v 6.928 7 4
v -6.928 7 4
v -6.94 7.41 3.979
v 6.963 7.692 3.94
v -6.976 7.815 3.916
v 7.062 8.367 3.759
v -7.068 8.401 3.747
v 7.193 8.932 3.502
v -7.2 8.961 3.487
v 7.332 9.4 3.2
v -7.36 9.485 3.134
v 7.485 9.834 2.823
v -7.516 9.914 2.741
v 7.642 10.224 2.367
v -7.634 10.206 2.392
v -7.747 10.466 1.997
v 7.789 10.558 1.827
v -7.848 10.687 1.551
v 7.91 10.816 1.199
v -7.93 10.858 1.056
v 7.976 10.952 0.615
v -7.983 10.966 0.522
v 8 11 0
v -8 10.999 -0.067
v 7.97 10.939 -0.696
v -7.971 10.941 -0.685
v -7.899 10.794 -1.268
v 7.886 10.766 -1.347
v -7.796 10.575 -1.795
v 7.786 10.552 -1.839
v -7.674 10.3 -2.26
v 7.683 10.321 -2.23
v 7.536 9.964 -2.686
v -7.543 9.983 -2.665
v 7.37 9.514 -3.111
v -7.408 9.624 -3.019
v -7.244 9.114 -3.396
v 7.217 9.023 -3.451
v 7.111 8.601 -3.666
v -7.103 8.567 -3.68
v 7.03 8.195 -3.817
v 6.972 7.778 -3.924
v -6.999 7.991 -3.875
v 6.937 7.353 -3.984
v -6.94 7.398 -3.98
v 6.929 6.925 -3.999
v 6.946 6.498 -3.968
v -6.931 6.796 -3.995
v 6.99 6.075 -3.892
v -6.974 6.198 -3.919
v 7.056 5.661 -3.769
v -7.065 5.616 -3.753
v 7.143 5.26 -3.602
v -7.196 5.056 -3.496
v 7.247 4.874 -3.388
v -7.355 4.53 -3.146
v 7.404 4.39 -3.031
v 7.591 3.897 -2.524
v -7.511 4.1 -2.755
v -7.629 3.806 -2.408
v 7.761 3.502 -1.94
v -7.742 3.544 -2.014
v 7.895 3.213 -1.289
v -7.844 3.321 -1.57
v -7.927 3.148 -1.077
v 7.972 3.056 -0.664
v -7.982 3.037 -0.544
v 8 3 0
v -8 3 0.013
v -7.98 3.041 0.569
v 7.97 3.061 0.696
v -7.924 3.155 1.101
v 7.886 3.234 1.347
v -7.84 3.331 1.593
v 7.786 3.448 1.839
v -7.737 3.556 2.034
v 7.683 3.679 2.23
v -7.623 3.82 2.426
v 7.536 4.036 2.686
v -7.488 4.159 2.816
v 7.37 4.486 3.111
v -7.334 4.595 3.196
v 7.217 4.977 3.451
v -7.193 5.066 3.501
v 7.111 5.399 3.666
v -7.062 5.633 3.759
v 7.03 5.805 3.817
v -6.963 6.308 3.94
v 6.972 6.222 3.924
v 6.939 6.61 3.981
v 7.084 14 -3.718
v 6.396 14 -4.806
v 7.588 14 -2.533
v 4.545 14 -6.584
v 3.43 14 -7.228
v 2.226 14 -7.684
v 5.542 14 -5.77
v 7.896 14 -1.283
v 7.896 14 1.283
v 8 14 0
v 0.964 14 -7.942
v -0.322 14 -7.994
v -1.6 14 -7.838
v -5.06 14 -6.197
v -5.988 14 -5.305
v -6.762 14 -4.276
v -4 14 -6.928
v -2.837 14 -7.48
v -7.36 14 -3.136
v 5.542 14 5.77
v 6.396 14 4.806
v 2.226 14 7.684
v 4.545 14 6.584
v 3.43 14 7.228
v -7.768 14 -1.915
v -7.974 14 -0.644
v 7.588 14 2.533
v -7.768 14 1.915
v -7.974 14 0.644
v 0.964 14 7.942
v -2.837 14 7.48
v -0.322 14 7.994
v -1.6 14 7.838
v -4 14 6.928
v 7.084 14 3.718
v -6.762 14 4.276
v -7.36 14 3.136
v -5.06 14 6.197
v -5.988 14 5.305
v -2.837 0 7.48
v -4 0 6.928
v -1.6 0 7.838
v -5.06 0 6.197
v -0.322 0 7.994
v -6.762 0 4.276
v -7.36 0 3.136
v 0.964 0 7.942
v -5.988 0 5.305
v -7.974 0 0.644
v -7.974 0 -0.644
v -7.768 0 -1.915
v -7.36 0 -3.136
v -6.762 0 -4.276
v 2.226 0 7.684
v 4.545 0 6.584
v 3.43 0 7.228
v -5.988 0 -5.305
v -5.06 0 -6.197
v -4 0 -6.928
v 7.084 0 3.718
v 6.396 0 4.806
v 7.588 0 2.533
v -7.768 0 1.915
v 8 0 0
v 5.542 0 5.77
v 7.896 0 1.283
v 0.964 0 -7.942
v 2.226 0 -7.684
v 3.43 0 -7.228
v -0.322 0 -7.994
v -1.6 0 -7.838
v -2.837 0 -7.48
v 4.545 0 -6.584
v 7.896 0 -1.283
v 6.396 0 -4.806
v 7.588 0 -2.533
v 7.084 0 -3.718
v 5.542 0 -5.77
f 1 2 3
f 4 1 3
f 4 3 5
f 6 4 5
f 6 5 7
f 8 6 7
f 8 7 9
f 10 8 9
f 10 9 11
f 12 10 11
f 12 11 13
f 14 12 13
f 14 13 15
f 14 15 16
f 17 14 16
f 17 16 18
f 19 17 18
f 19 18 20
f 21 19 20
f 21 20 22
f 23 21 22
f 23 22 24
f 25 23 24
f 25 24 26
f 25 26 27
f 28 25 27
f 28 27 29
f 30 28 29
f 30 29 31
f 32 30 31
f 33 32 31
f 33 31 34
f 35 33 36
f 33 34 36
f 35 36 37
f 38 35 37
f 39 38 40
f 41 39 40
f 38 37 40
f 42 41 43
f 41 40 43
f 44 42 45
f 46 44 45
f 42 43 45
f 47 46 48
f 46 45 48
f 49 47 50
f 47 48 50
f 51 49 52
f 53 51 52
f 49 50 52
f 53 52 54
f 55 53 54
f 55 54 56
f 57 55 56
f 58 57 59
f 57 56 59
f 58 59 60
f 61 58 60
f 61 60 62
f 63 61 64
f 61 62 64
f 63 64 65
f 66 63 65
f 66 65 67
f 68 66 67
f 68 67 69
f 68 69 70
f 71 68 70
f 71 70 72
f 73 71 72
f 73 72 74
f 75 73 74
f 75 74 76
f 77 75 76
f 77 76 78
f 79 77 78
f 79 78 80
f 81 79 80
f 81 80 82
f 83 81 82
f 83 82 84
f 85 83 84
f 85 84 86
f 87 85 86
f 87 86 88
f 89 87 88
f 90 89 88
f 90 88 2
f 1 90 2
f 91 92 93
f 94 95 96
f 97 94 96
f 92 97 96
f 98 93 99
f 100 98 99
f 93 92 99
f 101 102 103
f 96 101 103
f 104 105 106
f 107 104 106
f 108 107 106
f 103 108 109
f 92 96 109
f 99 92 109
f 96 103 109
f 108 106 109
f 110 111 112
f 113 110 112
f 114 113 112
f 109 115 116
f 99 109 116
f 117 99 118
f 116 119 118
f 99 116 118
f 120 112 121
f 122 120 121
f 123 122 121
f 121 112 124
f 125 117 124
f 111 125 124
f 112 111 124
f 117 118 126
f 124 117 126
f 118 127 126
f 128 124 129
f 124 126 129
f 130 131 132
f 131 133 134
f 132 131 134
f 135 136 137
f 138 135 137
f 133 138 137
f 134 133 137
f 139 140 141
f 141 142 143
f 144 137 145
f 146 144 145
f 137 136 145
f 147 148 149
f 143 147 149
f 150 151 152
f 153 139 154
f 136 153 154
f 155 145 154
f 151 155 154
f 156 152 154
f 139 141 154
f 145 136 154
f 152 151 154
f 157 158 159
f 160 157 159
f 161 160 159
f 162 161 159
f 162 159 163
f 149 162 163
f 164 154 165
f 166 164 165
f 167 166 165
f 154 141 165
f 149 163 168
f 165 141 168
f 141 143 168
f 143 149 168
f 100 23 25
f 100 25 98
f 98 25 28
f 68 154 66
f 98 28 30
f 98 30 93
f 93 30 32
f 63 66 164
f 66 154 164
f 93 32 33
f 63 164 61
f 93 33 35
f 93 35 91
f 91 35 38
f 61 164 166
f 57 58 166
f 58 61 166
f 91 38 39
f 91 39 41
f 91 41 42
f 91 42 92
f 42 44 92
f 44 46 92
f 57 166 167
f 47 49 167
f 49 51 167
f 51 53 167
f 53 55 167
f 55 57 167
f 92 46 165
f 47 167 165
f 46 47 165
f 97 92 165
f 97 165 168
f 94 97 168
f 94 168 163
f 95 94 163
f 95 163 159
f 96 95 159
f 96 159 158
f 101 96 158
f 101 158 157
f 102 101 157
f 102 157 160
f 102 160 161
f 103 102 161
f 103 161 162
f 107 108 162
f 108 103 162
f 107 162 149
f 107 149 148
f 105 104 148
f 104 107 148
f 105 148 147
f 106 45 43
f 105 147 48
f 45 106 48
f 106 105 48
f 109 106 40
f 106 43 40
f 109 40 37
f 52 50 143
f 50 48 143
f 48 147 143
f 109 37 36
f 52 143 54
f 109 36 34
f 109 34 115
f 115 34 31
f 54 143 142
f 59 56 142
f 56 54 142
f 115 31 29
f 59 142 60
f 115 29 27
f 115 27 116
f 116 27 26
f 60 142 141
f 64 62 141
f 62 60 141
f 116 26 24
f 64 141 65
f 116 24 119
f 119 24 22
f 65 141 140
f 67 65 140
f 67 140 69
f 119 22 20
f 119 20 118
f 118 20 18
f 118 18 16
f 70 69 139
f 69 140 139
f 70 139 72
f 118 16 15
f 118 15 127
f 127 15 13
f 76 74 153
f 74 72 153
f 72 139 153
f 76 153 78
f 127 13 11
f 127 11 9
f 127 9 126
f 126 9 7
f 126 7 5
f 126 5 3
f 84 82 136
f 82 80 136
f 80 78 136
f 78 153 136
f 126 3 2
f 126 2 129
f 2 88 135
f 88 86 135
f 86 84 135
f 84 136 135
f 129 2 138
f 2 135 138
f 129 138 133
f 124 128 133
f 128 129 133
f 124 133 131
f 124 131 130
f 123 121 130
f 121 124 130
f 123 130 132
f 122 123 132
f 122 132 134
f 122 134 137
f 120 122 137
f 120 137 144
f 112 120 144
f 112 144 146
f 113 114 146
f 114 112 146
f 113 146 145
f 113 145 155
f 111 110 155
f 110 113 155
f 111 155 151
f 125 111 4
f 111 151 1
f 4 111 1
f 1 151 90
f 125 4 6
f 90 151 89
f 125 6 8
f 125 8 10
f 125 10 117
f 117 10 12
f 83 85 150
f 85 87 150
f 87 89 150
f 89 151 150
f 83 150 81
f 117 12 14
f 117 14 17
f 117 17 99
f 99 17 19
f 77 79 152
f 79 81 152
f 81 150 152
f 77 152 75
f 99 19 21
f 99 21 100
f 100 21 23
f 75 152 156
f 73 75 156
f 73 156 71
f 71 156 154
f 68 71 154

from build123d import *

# Parameters (mm, degrees)
SKETCH1_R           = 8
BOSS_EXTRUDE1_DEPTH = 14
SKETCH2_W           = 16
SKETCH2_H           = 17.069791858
BOSS_EXTRUDE2_DEPTH = 7
SKETCH3_R           = 4
CUT_EXTRUDE1_DEPTH  = 29
SKETCH4_W           = 17.069791858
SKETCH4_H           = 7
CUT_EXTRUDE2_DEPTH  = 29


with BuildPart() as part:
    # Sketch1 → Boss-Extrude1 (new body)
    with BuildSketch(Plane(origin=(0, 0, 0), x_dir=(1, 0, 0), z_dir=(0, 1, 0))):
        Circle(SKETCH1_R)
    extrude(amount=BOSS_EXTRUDE1_DEPTH)

    # Sketch2 → Boss-Extrude2 (add)
    with BuildSketch(Plane(origin=(0, 14, 0), x_dir=(1, 0, 0), z_dir=(0, 1, 0))):
        Rectangle(SKETCH2_W, SKETCH2_H)
    extrude(amount=BOSS_EXTRUDE2_DEPTH)

    # Sketch3 → Cut-Extrude1 (cut)
    with BuildSketch(Plane.ZY.offset(8)):
        with Locations((0, 7)):
            Circle(SKETCH3_R)
    extrude(amount=-CUT_EXTRUDE1_DEPTH, mode=Mode.SUBTRACT)

    # Sketch4 → Cut-Extrude2 (cut)
    with BuildSketch(Plane.ZY.offset(8)):
        with Locations((0, 17.5)):
            Rectangle(SKETCH4_W, SKETCH4_H)
    extrude(amount=-CUT_EXTRUDE2_DEPTH, mode=Mode.SUBTRACT)


solid = part.part
